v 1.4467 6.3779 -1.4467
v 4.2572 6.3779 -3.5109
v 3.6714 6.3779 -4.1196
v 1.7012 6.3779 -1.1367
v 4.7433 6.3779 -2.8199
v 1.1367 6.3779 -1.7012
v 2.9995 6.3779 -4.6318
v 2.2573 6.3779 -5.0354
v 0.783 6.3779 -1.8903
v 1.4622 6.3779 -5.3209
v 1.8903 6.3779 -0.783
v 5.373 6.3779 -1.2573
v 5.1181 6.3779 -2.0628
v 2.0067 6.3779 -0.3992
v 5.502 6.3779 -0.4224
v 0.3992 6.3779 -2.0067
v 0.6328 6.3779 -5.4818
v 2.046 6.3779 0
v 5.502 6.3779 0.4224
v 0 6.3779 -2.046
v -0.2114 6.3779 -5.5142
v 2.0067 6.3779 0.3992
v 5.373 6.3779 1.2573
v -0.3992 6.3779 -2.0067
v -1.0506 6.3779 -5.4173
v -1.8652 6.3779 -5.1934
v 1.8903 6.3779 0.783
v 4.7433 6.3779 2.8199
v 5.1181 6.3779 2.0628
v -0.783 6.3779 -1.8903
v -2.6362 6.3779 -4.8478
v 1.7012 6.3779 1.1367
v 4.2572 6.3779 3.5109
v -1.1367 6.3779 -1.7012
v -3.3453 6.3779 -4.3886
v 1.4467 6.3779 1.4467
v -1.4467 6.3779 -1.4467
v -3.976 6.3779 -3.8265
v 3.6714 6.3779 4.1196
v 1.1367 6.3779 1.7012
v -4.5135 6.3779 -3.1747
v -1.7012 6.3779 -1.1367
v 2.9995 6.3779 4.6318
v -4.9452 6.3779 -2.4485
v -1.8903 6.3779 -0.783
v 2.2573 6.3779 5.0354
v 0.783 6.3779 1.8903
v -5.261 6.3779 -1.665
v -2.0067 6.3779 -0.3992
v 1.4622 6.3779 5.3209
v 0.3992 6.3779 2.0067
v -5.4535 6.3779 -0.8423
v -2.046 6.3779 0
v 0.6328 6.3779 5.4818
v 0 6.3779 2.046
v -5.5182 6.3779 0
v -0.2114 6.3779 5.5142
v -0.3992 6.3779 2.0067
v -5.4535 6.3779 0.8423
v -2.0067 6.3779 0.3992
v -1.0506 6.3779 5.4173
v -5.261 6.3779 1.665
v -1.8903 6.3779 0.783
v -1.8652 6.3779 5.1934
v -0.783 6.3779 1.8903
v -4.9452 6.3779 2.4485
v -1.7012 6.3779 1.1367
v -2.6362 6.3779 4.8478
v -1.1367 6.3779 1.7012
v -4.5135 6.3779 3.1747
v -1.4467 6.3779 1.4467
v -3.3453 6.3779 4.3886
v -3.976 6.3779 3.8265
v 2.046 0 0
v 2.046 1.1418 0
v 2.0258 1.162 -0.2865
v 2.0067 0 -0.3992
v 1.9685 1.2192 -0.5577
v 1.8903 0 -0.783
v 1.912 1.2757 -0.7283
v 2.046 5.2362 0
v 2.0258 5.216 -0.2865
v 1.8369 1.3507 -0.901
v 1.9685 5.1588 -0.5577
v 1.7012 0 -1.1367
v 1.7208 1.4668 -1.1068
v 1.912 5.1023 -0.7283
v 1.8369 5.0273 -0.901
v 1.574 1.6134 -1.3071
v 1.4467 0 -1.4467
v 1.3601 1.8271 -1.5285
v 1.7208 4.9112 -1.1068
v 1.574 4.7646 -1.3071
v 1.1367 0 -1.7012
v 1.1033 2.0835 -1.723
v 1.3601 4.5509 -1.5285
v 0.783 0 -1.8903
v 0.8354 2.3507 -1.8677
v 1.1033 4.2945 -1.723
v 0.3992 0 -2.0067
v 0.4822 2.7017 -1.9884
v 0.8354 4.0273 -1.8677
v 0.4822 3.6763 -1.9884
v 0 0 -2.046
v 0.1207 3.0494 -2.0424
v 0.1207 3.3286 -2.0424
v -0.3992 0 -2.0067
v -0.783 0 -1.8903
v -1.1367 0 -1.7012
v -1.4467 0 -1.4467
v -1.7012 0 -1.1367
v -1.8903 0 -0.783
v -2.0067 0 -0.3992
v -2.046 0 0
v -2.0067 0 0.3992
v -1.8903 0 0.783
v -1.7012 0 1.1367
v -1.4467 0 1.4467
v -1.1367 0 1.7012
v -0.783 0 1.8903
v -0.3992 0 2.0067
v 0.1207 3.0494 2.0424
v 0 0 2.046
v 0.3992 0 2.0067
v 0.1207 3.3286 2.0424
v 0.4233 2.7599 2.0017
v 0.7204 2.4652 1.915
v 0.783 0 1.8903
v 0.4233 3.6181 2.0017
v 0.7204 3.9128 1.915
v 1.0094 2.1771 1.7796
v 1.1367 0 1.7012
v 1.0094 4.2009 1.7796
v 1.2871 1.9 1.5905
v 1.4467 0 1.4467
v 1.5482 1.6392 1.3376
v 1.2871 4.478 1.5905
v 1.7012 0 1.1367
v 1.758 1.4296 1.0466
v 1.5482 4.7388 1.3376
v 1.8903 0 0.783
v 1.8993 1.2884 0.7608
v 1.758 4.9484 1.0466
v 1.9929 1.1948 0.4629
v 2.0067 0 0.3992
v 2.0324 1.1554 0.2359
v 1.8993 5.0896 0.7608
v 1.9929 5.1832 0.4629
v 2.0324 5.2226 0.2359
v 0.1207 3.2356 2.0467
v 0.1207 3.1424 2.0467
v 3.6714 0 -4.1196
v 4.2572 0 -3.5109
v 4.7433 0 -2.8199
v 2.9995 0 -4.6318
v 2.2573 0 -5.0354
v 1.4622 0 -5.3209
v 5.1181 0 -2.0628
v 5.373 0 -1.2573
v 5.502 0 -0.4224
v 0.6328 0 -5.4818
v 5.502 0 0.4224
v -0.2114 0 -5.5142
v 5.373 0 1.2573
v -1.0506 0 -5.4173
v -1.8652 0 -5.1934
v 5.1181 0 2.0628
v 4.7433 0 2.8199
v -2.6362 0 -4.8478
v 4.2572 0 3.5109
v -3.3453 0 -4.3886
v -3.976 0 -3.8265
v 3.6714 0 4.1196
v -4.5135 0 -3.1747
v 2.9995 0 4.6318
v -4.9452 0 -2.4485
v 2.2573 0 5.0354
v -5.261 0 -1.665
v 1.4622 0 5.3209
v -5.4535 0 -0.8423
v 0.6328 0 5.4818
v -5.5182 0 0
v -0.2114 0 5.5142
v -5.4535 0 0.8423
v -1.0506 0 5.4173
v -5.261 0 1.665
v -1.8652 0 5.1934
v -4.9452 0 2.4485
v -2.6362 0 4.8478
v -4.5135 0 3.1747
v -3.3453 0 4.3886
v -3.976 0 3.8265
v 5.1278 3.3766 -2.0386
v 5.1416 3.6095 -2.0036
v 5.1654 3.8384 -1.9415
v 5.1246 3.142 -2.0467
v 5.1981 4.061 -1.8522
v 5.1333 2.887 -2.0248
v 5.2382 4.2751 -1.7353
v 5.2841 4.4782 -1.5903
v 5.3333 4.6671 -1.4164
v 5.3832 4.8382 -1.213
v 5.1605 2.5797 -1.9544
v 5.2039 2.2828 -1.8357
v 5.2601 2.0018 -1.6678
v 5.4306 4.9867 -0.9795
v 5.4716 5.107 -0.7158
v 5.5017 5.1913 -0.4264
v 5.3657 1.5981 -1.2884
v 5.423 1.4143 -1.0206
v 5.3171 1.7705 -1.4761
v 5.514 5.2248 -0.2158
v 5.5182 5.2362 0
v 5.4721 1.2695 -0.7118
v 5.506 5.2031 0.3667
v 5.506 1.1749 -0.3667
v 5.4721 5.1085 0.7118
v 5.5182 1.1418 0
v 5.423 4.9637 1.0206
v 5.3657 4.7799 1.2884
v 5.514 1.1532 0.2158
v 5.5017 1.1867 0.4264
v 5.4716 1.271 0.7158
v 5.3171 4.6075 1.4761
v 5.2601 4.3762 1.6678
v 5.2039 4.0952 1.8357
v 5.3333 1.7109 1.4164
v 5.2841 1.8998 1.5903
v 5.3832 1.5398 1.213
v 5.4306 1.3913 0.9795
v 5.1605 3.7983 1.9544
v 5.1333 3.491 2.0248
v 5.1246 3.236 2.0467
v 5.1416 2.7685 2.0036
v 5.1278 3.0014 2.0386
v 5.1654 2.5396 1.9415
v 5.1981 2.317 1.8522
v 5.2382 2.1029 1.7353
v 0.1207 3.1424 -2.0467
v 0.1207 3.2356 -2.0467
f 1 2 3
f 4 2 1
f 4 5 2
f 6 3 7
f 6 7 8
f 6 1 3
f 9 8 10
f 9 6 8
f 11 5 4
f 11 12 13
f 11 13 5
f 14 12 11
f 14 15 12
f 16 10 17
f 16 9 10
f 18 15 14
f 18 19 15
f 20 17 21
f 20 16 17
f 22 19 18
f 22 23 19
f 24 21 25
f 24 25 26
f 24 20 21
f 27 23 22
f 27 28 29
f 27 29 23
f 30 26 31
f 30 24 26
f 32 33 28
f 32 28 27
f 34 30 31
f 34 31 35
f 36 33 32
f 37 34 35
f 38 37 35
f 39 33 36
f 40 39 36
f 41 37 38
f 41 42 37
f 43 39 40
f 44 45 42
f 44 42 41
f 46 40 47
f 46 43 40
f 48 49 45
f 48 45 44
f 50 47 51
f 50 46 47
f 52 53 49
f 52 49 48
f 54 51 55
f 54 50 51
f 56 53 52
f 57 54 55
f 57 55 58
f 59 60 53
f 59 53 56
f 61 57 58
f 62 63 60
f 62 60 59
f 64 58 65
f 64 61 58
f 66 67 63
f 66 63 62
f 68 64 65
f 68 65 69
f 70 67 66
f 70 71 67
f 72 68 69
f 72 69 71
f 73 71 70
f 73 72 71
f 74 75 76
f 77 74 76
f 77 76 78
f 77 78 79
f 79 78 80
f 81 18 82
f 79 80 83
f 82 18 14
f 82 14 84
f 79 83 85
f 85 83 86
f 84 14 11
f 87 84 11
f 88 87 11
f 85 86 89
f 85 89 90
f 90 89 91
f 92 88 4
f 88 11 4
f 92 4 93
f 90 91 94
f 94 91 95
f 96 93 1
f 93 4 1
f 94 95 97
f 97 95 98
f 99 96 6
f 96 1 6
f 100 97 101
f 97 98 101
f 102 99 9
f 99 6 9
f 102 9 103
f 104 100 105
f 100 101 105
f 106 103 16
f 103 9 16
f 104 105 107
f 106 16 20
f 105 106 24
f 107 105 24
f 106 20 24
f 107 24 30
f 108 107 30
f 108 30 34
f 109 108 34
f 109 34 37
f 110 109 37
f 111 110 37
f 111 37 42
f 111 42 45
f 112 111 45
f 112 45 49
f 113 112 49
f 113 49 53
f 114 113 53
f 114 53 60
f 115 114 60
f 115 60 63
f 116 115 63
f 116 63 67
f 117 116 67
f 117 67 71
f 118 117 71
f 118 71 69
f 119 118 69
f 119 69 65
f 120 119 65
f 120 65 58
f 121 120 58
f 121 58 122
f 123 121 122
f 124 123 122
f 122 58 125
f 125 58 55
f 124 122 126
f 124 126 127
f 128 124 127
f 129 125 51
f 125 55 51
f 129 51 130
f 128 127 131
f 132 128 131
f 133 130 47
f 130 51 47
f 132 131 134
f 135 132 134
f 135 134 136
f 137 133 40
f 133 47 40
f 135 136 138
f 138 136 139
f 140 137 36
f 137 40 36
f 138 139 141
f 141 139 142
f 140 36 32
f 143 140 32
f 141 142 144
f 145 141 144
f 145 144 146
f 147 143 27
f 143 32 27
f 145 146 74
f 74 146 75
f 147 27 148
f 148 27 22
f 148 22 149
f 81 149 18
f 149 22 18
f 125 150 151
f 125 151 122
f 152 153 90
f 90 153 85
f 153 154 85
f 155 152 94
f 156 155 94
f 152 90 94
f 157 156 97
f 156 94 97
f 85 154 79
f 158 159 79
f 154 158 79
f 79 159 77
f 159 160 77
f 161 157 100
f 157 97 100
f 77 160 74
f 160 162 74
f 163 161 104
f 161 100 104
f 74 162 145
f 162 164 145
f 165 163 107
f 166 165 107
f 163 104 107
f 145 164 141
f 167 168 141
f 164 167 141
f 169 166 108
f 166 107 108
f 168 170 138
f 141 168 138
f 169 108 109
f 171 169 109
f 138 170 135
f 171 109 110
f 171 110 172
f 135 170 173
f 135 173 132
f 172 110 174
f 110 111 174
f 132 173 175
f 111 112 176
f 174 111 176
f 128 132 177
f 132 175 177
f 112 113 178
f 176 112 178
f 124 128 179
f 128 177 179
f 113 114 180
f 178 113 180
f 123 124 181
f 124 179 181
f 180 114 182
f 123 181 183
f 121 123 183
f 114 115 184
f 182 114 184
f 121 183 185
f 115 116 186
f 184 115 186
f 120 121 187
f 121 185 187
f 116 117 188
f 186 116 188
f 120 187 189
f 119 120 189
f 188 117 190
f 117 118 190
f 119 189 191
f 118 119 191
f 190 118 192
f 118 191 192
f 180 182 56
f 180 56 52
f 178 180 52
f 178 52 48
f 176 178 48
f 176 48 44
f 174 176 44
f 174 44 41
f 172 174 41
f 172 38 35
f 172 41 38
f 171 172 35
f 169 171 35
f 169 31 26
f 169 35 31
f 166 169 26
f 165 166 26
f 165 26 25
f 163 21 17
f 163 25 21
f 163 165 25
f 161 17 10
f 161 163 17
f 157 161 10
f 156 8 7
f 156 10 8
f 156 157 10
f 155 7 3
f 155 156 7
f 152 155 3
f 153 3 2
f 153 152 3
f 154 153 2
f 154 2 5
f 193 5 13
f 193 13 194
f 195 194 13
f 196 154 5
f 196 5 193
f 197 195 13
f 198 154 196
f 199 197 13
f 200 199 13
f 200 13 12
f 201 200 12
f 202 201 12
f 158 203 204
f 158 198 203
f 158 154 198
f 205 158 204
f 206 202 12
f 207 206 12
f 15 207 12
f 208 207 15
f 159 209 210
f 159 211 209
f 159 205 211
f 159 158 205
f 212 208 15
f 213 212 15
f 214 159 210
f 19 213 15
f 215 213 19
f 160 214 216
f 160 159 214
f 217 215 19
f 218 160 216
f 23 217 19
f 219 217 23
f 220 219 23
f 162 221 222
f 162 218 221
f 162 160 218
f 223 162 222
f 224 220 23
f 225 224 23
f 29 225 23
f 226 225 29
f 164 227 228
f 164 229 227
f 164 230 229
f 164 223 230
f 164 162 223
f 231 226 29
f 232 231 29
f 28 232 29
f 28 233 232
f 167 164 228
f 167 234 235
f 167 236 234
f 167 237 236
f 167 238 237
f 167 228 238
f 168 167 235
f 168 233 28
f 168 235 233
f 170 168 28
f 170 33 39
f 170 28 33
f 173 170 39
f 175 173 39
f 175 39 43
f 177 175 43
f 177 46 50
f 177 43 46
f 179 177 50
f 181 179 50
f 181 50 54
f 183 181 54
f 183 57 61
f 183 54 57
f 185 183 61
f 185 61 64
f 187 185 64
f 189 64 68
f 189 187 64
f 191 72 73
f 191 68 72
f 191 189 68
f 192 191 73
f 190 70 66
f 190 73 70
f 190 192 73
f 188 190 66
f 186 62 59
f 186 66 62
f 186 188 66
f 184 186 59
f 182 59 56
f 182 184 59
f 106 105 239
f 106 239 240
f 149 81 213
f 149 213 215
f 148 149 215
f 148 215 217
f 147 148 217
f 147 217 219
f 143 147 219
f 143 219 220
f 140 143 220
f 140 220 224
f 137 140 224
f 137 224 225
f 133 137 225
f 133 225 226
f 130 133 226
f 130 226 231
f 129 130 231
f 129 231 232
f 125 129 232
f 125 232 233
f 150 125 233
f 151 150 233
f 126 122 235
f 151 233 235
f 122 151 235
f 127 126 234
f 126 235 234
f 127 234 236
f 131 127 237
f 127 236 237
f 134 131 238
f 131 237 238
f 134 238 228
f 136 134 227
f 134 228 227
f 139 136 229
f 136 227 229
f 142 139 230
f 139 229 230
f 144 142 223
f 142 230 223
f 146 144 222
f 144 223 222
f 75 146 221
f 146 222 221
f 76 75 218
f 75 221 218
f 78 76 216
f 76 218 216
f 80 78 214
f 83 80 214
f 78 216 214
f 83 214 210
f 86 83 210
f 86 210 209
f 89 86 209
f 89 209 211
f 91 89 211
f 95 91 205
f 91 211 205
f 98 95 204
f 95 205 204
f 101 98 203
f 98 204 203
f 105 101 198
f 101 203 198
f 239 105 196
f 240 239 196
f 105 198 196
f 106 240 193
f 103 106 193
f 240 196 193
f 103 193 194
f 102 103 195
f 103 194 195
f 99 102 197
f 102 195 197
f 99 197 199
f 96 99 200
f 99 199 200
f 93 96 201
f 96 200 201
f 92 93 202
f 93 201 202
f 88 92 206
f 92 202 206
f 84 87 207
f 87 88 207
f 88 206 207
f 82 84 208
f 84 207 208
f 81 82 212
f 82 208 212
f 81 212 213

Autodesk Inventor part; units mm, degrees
ref_plane "XZ Plane" through (0, 0, 0) normal (0, 1, 0) x (-1, 0, 0)
ref_plane "XY Plane" through (0, 0, 0) normal (0, 0, 1) x (1, 0, 0)
sketch "Sketch1" plane through (0, 0, 0) normal (0, 1, 0) x (-1, 0, 0)
  circle A0 centre (0, 0) radius 5.5182
  dimension "d0" = 11.0363
extrude "Extrusion1" add sketch "Sketch1" along normal blind 6.3779
sketch "Sketch2" plane through (0, 6.3779, 0) normal (0, 1, 0) x (1, 0, 0)
  circle A0 centre (0, 0) radius 2.046
  dimension "d3" = 4.0919
extrude "Extrusion2" cut sketch "Sketch2" against normal blind 11.1125
ref_plane "Work Plane1" through (5.5182, 0, 0) normal (1, 0, 0) x (0, 1, 0)
sketch "Sketch3" plane through (5.5182, 0, 0) normal (1, 0, 0) x (0, 1, 0)
  line L0 (6.3779, -5.5182) -> (6.3779, 5.5182) projected
  line L1 (6.3779, 0) -> (0, 0)
  circle A0 centre (3.189, 0) radius 2.0472
  dimension "d6" = 4.0945
extrude "Extrusion3" cut sketch "Sketch3" against normal blind 5.3975
properties part number "Axle hub with no cricle thing"
